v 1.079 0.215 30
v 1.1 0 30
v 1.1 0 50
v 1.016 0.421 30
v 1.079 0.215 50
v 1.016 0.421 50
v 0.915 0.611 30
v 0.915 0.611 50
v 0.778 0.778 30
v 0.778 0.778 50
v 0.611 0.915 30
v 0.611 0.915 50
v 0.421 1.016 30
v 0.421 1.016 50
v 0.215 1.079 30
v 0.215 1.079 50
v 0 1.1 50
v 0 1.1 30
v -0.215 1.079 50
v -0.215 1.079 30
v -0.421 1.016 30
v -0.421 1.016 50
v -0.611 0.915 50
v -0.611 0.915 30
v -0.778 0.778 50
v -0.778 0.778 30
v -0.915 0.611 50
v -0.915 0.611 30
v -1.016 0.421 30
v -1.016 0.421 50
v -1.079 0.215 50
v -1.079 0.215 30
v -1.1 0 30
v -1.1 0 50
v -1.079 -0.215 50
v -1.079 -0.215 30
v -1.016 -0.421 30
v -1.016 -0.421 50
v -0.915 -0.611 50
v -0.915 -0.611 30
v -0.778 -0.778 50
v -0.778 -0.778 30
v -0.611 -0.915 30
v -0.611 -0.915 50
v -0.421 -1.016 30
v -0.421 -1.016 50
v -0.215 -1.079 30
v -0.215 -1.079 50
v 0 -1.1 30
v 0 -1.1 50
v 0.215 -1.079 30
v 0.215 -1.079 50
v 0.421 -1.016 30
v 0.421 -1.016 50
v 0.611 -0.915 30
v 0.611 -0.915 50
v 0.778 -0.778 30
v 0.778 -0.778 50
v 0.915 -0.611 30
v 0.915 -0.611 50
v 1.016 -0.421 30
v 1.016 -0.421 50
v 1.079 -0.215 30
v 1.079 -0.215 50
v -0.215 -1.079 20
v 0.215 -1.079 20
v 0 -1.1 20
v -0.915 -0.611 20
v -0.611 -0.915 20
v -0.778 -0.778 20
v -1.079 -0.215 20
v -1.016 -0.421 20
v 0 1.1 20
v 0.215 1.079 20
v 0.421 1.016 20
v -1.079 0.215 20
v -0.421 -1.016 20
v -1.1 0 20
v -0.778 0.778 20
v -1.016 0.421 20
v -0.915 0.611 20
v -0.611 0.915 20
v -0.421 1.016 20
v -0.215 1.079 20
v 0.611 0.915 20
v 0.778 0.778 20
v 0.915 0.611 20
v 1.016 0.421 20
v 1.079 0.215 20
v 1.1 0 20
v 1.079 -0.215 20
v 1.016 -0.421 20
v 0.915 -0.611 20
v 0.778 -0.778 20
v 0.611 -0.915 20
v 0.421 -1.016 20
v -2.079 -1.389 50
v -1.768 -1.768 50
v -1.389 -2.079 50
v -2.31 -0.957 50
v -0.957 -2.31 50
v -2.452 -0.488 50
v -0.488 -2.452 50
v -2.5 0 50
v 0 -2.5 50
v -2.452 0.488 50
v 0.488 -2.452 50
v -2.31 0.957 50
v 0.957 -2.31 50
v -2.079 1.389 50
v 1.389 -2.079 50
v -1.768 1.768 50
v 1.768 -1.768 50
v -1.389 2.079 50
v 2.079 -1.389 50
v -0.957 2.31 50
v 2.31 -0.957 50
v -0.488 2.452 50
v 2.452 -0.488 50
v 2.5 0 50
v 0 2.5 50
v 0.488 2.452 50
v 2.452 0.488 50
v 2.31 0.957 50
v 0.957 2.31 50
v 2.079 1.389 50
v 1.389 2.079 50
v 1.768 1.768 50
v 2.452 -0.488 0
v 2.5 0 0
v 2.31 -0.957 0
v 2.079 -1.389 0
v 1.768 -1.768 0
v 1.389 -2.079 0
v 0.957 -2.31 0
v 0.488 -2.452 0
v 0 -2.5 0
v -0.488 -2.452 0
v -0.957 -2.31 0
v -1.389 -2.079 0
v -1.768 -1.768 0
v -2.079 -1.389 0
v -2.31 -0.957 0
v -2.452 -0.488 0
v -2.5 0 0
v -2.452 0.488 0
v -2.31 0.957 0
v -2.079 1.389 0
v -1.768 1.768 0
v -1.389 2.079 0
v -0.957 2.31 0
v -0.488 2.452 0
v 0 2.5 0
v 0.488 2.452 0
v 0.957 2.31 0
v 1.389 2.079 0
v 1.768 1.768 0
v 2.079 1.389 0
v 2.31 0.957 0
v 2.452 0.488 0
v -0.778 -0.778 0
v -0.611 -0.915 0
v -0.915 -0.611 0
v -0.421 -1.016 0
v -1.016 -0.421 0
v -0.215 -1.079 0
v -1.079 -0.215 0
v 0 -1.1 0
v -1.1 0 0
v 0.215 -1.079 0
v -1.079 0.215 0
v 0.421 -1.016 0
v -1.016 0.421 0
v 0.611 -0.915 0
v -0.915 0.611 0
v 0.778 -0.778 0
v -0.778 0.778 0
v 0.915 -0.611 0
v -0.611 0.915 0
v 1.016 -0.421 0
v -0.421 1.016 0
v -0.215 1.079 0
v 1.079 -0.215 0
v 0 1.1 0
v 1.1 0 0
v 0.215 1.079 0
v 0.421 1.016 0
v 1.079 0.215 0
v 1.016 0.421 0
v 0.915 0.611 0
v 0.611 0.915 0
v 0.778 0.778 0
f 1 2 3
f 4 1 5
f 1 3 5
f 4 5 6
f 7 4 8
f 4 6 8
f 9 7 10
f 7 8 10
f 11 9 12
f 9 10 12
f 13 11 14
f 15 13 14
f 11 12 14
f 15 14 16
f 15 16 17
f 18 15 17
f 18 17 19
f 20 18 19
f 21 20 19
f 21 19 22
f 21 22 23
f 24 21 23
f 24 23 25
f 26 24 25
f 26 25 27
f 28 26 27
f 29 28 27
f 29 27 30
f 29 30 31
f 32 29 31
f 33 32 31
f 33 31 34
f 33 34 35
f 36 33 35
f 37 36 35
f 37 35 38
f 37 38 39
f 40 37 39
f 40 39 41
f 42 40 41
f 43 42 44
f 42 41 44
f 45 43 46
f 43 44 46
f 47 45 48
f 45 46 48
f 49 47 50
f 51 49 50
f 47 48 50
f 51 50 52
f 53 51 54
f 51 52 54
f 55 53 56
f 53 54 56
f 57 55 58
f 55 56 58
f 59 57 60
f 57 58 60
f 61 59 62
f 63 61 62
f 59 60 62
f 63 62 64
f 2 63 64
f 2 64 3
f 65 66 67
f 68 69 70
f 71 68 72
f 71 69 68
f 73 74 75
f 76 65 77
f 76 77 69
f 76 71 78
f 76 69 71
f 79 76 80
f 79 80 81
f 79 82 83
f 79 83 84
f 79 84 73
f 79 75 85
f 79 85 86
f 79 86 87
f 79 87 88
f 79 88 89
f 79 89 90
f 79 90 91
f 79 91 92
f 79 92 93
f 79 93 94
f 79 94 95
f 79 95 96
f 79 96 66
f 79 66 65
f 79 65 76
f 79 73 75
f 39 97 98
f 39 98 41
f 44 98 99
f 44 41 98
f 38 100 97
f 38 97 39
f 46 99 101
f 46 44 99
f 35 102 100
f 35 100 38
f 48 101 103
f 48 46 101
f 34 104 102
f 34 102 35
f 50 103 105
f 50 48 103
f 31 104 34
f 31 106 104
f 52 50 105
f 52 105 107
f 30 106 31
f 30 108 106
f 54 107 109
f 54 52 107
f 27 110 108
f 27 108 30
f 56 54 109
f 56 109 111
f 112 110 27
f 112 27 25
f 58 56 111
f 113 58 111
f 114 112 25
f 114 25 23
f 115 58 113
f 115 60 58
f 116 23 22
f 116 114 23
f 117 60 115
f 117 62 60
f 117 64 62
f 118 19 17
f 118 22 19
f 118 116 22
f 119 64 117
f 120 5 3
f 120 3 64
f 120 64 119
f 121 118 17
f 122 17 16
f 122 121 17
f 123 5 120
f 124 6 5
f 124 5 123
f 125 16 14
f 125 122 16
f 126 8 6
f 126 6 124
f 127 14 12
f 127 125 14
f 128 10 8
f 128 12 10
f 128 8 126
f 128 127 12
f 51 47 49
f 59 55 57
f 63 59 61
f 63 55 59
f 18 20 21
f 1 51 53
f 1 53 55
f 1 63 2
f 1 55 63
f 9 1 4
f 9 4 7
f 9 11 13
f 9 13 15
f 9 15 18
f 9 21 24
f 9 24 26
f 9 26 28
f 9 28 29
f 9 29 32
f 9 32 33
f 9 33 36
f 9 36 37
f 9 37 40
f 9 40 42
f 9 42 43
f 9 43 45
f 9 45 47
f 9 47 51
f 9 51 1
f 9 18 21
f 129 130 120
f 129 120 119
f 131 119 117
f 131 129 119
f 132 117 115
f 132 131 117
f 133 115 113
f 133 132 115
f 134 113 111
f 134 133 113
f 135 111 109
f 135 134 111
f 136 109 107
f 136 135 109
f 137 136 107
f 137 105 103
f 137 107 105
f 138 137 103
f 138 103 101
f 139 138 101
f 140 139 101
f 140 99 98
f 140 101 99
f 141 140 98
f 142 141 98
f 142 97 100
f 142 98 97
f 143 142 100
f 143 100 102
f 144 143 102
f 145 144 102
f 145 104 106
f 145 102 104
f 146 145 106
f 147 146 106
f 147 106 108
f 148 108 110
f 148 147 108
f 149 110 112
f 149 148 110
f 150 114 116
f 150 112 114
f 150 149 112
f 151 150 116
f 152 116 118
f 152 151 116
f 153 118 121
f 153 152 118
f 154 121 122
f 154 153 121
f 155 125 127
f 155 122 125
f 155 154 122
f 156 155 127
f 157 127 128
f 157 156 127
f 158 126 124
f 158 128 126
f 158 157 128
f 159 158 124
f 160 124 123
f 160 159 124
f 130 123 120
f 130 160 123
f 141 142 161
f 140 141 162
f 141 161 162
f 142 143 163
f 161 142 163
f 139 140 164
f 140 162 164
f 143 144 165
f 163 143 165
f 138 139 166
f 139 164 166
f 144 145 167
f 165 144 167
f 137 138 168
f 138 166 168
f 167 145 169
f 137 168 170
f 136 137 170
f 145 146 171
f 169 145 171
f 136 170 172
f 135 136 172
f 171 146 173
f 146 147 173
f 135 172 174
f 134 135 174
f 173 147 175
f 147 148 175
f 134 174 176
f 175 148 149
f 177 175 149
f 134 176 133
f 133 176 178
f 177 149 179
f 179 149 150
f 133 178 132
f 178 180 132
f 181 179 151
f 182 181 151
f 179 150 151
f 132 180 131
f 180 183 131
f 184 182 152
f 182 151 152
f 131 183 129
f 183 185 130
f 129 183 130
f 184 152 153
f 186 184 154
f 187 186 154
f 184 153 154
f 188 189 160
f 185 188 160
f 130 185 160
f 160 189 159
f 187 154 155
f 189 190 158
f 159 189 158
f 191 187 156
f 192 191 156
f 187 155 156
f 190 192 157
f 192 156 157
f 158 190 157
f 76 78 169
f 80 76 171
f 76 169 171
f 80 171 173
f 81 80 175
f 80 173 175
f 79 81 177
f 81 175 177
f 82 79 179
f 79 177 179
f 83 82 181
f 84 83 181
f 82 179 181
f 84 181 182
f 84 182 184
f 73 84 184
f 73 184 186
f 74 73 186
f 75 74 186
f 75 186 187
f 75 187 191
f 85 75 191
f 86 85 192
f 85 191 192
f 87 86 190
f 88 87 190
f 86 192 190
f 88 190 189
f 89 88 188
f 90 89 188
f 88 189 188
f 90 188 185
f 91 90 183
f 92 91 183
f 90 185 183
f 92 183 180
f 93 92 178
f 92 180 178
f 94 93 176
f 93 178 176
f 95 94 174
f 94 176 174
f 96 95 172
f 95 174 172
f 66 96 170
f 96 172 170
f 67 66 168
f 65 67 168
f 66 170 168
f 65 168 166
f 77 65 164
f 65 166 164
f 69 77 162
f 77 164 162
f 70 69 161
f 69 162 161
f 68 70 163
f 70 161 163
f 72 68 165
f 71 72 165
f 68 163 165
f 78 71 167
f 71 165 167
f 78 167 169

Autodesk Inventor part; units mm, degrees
ref_plane "YZ Plane" through (0, 0, 0) normal (1, 0, 0) x (0, 1, 0)
ref_plane "XZ Plane" through (0, 0, 0) normal (0, 1, 0) x (-1, 0, 0)
ref_plane "XY Plane" through (0, 0, 0) normal (0, 0, 1) x (1, 0, 0)
sketch "Sketch1" plane through (0, 0, 0) normal (0, 0, 1) x (1, 0, 0)
  circle A0 centre (0, 0) radius 2.5
  dimension "d0" = 5
extrude "Extrusion1" add sketch "Sketch1" along normal blind 50
sketch "Sketch2" plane through (0, 0, 50) normal (0, 0, 1) x (1, 0, 0)
  circle A0 centre (0, 0) radius 1.1
  dimension "d3" = 2.2
extrude "Extrusion2" cut sketch "Sketch2" against normal blind 20
sketch "Sketch3" plane through (0, 0, 0) normal (0, 0, -1) x (-1, 0, 0)
  circle A0 centre (0, 0) radius 1.1 projected
extrude "Extrusion3" cut sketch "Sketch3" against normal blind 20
thread "Thread1" size "M2.5x0.45" class "6H" standard "ANSI Metric M Profile" length 16
thread "Thread2" size "M2.5x0.45" class "6H" standard "ANSI Metric M Profile" length 16
properties part number "AxisLinear"
